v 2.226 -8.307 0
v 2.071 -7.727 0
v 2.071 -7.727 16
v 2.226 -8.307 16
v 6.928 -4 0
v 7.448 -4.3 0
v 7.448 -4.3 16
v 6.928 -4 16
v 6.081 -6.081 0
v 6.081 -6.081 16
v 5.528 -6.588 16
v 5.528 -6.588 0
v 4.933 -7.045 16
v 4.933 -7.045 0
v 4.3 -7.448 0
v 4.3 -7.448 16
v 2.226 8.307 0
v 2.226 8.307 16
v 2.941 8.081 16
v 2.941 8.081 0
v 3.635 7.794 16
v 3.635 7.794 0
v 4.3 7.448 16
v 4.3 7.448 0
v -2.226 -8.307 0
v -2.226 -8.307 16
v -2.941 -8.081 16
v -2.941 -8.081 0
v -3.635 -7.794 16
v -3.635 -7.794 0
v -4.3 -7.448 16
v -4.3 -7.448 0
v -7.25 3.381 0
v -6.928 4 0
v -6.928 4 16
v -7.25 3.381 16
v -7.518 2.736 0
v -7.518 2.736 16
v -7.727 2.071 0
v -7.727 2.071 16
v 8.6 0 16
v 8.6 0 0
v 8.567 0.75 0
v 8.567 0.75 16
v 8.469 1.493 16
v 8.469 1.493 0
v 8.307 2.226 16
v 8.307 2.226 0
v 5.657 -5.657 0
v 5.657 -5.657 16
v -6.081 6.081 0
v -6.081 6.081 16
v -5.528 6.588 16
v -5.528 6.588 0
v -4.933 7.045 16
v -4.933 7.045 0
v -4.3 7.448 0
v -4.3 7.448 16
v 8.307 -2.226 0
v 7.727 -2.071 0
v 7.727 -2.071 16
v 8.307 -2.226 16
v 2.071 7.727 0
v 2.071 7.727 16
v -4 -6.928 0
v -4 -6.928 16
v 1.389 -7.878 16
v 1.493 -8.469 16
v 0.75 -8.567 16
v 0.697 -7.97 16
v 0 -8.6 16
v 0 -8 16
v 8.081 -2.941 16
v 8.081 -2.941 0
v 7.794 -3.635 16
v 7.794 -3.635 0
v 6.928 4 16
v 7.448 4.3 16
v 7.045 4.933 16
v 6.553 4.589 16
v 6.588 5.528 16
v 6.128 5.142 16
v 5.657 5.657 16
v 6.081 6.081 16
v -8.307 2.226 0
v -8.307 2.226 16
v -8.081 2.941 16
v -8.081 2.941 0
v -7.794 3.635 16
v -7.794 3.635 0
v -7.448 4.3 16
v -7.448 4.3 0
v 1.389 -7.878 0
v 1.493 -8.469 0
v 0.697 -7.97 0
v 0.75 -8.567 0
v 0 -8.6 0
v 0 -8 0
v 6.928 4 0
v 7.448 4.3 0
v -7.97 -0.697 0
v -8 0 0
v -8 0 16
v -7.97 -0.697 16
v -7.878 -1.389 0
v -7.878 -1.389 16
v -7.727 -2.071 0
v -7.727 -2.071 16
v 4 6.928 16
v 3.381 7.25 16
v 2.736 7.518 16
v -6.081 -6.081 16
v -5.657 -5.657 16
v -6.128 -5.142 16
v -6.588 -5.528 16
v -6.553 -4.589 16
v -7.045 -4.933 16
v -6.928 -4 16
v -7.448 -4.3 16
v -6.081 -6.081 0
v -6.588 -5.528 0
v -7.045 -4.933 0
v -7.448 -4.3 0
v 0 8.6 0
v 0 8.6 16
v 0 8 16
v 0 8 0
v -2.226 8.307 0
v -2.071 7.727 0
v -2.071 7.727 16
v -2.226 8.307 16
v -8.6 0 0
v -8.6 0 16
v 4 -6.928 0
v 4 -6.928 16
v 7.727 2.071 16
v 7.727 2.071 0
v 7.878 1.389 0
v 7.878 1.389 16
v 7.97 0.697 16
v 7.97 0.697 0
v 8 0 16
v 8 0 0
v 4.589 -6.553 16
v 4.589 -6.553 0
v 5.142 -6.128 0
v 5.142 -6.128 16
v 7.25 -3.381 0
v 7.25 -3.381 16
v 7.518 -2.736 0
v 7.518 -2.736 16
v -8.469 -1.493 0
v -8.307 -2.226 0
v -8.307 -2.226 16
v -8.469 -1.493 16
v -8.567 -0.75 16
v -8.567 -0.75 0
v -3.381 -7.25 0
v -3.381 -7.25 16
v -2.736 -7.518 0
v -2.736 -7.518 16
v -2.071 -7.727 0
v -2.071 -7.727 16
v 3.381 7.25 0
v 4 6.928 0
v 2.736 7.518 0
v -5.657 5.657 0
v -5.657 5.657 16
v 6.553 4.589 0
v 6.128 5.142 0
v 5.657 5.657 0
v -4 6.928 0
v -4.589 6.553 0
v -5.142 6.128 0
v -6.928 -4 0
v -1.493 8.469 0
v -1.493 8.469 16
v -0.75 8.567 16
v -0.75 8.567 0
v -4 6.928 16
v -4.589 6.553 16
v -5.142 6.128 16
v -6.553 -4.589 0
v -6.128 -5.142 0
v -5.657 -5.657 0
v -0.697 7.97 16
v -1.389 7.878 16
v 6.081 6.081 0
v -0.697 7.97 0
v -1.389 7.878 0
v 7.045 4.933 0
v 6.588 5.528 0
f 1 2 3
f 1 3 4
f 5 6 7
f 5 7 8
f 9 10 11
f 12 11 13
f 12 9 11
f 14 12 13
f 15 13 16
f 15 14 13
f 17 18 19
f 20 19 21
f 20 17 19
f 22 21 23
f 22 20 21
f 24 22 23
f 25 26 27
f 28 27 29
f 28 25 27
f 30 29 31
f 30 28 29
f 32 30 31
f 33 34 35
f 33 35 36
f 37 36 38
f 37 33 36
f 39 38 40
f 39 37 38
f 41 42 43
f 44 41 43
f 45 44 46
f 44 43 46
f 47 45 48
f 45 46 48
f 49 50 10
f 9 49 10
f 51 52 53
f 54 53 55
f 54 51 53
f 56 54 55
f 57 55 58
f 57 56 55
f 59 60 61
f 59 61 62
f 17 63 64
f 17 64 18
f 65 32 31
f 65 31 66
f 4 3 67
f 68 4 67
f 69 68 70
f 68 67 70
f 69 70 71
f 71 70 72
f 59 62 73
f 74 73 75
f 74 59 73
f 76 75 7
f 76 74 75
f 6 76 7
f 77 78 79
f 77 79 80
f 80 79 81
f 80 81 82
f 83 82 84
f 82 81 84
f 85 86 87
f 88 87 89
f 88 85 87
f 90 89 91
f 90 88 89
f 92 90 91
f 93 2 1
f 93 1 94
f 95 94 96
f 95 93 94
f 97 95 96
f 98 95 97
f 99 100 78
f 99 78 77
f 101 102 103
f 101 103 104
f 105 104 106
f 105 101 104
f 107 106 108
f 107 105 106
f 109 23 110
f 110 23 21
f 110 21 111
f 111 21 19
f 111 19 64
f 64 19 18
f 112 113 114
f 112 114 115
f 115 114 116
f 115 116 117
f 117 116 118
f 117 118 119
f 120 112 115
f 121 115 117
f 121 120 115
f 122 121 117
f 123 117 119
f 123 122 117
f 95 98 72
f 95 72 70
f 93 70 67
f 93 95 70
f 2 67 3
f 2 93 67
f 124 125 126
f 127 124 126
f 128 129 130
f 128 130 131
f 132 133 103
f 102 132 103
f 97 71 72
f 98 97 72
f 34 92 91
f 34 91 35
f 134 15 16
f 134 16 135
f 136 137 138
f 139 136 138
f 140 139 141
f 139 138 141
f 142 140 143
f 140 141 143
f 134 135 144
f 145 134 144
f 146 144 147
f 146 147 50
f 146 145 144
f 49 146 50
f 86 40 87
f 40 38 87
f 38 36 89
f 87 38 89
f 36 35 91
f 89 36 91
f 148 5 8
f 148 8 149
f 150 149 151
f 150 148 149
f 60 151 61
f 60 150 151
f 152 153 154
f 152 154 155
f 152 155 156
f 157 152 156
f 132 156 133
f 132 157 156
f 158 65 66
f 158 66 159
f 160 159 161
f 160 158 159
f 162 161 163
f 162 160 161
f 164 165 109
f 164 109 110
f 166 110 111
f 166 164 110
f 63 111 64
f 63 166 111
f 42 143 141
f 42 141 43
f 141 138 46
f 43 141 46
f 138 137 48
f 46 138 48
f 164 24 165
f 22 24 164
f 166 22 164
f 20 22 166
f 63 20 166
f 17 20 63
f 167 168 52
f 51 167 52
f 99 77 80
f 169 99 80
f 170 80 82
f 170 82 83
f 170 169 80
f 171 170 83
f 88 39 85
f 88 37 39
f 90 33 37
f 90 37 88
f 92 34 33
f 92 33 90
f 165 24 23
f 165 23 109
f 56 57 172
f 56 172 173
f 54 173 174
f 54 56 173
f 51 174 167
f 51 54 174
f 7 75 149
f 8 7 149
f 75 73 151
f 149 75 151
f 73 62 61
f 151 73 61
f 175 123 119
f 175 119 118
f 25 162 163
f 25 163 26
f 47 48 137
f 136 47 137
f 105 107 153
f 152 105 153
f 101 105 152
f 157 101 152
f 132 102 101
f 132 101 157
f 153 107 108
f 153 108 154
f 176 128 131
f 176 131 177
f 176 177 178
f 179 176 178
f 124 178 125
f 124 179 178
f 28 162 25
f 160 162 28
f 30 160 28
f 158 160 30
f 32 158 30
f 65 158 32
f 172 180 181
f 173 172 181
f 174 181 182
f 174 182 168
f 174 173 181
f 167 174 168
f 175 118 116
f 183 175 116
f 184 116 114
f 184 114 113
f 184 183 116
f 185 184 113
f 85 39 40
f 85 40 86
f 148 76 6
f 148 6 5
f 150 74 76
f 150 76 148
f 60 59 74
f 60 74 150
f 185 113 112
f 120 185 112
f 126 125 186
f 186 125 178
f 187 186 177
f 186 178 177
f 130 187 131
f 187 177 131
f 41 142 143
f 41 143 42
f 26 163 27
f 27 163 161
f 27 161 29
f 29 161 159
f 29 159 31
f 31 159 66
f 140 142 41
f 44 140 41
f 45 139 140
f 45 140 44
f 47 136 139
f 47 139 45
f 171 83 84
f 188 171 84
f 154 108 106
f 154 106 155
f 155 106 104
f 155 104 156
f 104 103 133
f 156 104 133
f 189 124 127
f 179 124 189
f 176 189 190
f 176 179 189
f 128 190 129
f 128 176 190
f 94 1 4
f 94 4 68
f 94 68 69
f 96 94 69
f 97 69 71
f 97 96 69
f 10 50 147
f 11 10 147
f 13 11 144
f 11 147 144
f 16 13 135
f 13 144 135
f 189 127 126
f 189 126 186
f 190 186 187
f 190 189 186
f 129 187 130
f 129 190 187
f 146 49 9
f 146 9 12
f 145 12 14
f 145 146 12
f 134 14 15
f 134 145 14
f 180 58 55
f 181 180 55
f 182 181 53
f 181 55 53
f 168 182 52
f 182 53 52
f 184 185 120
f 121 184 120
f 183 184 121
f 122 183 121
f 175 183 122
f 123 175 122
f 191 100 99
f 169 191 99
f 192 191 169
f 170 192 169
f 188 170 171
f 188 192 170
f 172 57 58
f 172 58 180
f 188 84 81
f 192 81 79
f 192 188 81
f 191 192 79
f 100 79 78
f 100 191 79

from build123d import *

# Parameters (mm, degrees)
BOSS_EXTRU_1_DEPTH    = 16
BOSS_EXTRU_1_2_DEPTH  = 16
BOSS_EXTRU_1_3_DEPTH  = 16
BOSS_EXTRU_1_4_DEPTH  = 16
BOSS_EXTRU_1_5_DEPTH  = 16
BOSS_EXTRU_1_6_DEPTH  = 16
BOSS_EXTRU_1_7_DEPTH  = 16
BOSS_EXTRU_1_8_DEPTH  = 16
BOSS_EXTRU_1_9_DEPTH  = 16
BOSS_EXTRU_1_10_DEPTH = 16
BOSS_EXTRU_1_11_DEPTH = 16
BOSS_EXTRU_1_12_DEPTH = 16


with BuildPart() as part:
    # Esquisse1 → Boss.-Extru.1 (new body)
    with BuildSketch(Plane.XY):
        with BuildLine():
            Line((8, 0), (8.6, 0))
            ThreePointArc((8.6, 0), (8.526425808, 1.122525253), (8.306962106, 2.225843788))
            Line((8.306962106, 2.225843788), (7.72740661, 2.070552361))
            ThreePointArc((7.72740661, 2.070552361), (7.931558891, 1.044209538), (8, 0))
        make_face()
    extrude(amount=BOSS_EXTRU_1_DEPTH)


with BuildPart() as body_2:
    # Esquisse1 → Boss.-Extru.1 2 (new body)
    with BuildSketch(Plane.XY):
        with BuildLine():
            Line((7.72740661, -2.070552361), (8.306962106, -2.225843788))
            ThreePointArc((8.306962106, -2.225843788), (7.94536398, -3.291077518), (7.447818473, -4.3))
            Line((7.447818473, -4.3), (6.92820323, -4))
            ThreePointArc((6.92820323, -4), (7.39103626, -3.061467459), (7.72740661, -2.070552361))
        make_face()
    extrude(amount=BOSS_EXTRU_1_2_DEPTH)


with BuildPart() as body_3:
    # Esquisse1 → Boss.-Extru.1 3 (new body)
    with BuildSketch(Plane.XY):
        with BuildLine():
            Line((5.656854249, -5.656854249), (6.081118318, -6.081118318))
            ThreePointArc((6.081118318, -6.081118318), (5.235348289, -6.822838727), (4.3, -7.447818473))
            Line((4.3, -7.447818473), (4, -6.92820323))
            ThreePointArc((4, -6.92820323), (4.870091432, -6.346826722), (5.656854249, -5.656854249))
        make_face()
    extrude(amount=BOSS_EXTRU_1_3_DEPTH)


with BuildPart() as body_4:
    # Esquisse1 → Boss.-Extru.1 4 (new body)
    with BuildSketch(Plane.XY):
        with BuildLine():
            Line((2.070552361, -7.72740661), (2.225843788, -8.306962106))
            ThreePointArc((2.225843788, -8.306962106), (1.122525253, -8.526425808), (0, -8.6))
            Line((0, -8.6), (0, -8))
            ThreePointArc((0, -8), (1.044209538, -7.931558891), (2.070552361, -7.72740661))
        make_face()
    extrude(amount=BOSS_EXTRU_1_4_DEPTH)


with BuildPart() as body_5:
    # Esquisse1 → Boss.-Extru.1 5 (new body)
    with BuildSketch(Plane.XY):
        with BuildLine():
            Line((-2.070552361, -7.72740661), (-2.225843788, -8.306962106))
            ThreePointArc((-2.225843788, -8.306962106), (-3.291077518, -7.94536398), (-4.3, -7.447818473))
            Line((-4.3, -7.447818473), (-4, -6.92820323))
            ThreePointArc((-4, -6.92820323), (-3.061467459, -7.39103626), (-2.070552361, -7.72740661))
        make_face()
    extrude(amount=BOSS_EXTRU_1_5_DEPTH)


with BuildPart() as body_6:
    # Esquisse1 → Boss.-Extru.1 6 (new body)
    with BuildSketch(Plane.XY):
        with BuildLine():
            Line((-5.656854249, -5.656854249), (-6.081118318, -6.081118318))
            ThreePointArc((-6.081118318, -6.081118318), (-6.822838727, -5.235348289), (-7.447818473, -4.3))
            Line((-7.447818473, -4.3), (-6.92820323, -4))
            ThreePointArc((-6.92820323, -4), (-6.346826722, -4.870091432), (-5.656854249, -5.656854249))
        make_face()
    extrude(amount=BOSS_EXTRU_1_6_DEPTH)


with BuildPart() as body_7:
    # Esquisse1 → Boss.-Extru.1 7 (new body)
    with BuildSketch(Plane.XY):
        with BuildLine():
            Line((-7.72740661, -2.070552361), (-8.306962106, -2.225843788))
            ThreePointArc((-8.306962106, -2.225843788), (-8.526425808, -1.122525253), (-8.6, 0))
            Line((-8.6, 0), (-8, 0))
            ThreePointArc((-8, 0), (-7.931558891, -1.044209538), (-7.72740661, -2.070552361))
        make_face()
    extrude(amount=BOSS_EXTRU_1_7_DEPTH)


with BuildPart() as body_8:
    # Esquisse1 → Boss.-Extru.1 8 (new body)
    with BuildSketch(Plane.XY):
        with BuildLine():
            Line((-7.72740661, 2.070552361), (-8.306962106, 2.225843788))
            ThreePointArc((-8.306962106, 2.225843788), (-7.94536398, 3.291077518), (-7.447818473, 4.3))
            Line((-7.447818473, 4.3), (-6.92820323, 4))
            ThreePointArc((-6.92820323, 4), (-7.39103626, 3.061467459), (-7.72740661, 2.070552361))
        make_face()
    extrude(amount=BOSS_EXTRU_1_8_DEPTH)


with BuildPart() as body_9:
    # Esquisse1 → Boss.-Extru.1 9 (new body)
    with BuildSketch(Plane.XY):
        with BuildLine():
            Line((-5.656854249, 5.656854249), (-6.081118318, 6.081118318))
            ThreePointArc((-6.081118318, 6.081118318), (-5.235348289, 6.822838727), (-4.3, 7.447818473))
            Line((-4.3, 7.447818473), (-4, 6.92820323))
            ThreePointArc((-4, 6.92820323), (-4.870091432, 6.346826722), (-5.656854249, 5.656854249))
        make_face()
    extrude(amount=BOSS_EXTRU_1_9_DEPTH)


with BuildPart() as body_10:
    # Esquisse1 → Boss.-Extru.1 10 (new body)
    with BuildSketch(Plane.XY):
        with BuildLine():
            Line((-2.070552361, 7.72740661), (-2.225843788, 8.306962106))
            ThreePointArc((-2.225843788, 8.306962106), (-1.122525253, 8.526425808), (0, 8.6))
            Line((0, 8.6), (0, 8))
            ThreePointArc((0, 8), (-1.044209538, 7.931558891), (-2.070552361, 7.72740661))
        make_face()
    extrude(amount=BOSS_EXTRU_1_10_DEPTH)


with BuildPart() as body_11:
    # Esquisse1 → Boss.-Extru.1 11 (new body)
    with BuildSketch(Plane.XY):
        with BuildLine():
            Line((2.070552361, 7.72740661), (2.225843788, 8.306962106))
            ThreePointArc((2.225843788, 8.306962106), (3.291077518, 7.94536398), (4.3, 7.447818473))
            Line((4.3, 7.447818473), (4, 6.92820323))
            ThreePointArc((4, 6.92820323), (3.061467459, 7.39103626), (2.070552361, 7.72740661))
        make_face()
    extrude(amount=BOSS_EXTRU_1_11_DEPTH)


with BuildPart() as body_12:
    # Esquisse1 → Boss.-Extru.1 12 (new body)
    with BuildSketch(Plane.XY):
        with BuildLine():
            Line((5.656854249, 5.656854249), (6.081118318, 6.081118318))
            ThreePointArc((6.081118318, 6.081118318), (6.822838727, 5.235348289), (7.447818473, 4.3))
            Line((7.447818473, 4.3), (6.92820323, 4))
            ThreePointArc((6.92820323, 4), (6.346826722, 4.870091432), (5.656854249, 5.656854249))
        make_face()
    extrude(amount=BOSS_EXTRU_1_12_DEPTH)


solid = Compound([part.part, body_2.part, body_3.part, body_4.part, body_5.part, body_6.part, body_7.part, body_8.part, body_9.part, body_10.part, body_11.part, body_12.part])
